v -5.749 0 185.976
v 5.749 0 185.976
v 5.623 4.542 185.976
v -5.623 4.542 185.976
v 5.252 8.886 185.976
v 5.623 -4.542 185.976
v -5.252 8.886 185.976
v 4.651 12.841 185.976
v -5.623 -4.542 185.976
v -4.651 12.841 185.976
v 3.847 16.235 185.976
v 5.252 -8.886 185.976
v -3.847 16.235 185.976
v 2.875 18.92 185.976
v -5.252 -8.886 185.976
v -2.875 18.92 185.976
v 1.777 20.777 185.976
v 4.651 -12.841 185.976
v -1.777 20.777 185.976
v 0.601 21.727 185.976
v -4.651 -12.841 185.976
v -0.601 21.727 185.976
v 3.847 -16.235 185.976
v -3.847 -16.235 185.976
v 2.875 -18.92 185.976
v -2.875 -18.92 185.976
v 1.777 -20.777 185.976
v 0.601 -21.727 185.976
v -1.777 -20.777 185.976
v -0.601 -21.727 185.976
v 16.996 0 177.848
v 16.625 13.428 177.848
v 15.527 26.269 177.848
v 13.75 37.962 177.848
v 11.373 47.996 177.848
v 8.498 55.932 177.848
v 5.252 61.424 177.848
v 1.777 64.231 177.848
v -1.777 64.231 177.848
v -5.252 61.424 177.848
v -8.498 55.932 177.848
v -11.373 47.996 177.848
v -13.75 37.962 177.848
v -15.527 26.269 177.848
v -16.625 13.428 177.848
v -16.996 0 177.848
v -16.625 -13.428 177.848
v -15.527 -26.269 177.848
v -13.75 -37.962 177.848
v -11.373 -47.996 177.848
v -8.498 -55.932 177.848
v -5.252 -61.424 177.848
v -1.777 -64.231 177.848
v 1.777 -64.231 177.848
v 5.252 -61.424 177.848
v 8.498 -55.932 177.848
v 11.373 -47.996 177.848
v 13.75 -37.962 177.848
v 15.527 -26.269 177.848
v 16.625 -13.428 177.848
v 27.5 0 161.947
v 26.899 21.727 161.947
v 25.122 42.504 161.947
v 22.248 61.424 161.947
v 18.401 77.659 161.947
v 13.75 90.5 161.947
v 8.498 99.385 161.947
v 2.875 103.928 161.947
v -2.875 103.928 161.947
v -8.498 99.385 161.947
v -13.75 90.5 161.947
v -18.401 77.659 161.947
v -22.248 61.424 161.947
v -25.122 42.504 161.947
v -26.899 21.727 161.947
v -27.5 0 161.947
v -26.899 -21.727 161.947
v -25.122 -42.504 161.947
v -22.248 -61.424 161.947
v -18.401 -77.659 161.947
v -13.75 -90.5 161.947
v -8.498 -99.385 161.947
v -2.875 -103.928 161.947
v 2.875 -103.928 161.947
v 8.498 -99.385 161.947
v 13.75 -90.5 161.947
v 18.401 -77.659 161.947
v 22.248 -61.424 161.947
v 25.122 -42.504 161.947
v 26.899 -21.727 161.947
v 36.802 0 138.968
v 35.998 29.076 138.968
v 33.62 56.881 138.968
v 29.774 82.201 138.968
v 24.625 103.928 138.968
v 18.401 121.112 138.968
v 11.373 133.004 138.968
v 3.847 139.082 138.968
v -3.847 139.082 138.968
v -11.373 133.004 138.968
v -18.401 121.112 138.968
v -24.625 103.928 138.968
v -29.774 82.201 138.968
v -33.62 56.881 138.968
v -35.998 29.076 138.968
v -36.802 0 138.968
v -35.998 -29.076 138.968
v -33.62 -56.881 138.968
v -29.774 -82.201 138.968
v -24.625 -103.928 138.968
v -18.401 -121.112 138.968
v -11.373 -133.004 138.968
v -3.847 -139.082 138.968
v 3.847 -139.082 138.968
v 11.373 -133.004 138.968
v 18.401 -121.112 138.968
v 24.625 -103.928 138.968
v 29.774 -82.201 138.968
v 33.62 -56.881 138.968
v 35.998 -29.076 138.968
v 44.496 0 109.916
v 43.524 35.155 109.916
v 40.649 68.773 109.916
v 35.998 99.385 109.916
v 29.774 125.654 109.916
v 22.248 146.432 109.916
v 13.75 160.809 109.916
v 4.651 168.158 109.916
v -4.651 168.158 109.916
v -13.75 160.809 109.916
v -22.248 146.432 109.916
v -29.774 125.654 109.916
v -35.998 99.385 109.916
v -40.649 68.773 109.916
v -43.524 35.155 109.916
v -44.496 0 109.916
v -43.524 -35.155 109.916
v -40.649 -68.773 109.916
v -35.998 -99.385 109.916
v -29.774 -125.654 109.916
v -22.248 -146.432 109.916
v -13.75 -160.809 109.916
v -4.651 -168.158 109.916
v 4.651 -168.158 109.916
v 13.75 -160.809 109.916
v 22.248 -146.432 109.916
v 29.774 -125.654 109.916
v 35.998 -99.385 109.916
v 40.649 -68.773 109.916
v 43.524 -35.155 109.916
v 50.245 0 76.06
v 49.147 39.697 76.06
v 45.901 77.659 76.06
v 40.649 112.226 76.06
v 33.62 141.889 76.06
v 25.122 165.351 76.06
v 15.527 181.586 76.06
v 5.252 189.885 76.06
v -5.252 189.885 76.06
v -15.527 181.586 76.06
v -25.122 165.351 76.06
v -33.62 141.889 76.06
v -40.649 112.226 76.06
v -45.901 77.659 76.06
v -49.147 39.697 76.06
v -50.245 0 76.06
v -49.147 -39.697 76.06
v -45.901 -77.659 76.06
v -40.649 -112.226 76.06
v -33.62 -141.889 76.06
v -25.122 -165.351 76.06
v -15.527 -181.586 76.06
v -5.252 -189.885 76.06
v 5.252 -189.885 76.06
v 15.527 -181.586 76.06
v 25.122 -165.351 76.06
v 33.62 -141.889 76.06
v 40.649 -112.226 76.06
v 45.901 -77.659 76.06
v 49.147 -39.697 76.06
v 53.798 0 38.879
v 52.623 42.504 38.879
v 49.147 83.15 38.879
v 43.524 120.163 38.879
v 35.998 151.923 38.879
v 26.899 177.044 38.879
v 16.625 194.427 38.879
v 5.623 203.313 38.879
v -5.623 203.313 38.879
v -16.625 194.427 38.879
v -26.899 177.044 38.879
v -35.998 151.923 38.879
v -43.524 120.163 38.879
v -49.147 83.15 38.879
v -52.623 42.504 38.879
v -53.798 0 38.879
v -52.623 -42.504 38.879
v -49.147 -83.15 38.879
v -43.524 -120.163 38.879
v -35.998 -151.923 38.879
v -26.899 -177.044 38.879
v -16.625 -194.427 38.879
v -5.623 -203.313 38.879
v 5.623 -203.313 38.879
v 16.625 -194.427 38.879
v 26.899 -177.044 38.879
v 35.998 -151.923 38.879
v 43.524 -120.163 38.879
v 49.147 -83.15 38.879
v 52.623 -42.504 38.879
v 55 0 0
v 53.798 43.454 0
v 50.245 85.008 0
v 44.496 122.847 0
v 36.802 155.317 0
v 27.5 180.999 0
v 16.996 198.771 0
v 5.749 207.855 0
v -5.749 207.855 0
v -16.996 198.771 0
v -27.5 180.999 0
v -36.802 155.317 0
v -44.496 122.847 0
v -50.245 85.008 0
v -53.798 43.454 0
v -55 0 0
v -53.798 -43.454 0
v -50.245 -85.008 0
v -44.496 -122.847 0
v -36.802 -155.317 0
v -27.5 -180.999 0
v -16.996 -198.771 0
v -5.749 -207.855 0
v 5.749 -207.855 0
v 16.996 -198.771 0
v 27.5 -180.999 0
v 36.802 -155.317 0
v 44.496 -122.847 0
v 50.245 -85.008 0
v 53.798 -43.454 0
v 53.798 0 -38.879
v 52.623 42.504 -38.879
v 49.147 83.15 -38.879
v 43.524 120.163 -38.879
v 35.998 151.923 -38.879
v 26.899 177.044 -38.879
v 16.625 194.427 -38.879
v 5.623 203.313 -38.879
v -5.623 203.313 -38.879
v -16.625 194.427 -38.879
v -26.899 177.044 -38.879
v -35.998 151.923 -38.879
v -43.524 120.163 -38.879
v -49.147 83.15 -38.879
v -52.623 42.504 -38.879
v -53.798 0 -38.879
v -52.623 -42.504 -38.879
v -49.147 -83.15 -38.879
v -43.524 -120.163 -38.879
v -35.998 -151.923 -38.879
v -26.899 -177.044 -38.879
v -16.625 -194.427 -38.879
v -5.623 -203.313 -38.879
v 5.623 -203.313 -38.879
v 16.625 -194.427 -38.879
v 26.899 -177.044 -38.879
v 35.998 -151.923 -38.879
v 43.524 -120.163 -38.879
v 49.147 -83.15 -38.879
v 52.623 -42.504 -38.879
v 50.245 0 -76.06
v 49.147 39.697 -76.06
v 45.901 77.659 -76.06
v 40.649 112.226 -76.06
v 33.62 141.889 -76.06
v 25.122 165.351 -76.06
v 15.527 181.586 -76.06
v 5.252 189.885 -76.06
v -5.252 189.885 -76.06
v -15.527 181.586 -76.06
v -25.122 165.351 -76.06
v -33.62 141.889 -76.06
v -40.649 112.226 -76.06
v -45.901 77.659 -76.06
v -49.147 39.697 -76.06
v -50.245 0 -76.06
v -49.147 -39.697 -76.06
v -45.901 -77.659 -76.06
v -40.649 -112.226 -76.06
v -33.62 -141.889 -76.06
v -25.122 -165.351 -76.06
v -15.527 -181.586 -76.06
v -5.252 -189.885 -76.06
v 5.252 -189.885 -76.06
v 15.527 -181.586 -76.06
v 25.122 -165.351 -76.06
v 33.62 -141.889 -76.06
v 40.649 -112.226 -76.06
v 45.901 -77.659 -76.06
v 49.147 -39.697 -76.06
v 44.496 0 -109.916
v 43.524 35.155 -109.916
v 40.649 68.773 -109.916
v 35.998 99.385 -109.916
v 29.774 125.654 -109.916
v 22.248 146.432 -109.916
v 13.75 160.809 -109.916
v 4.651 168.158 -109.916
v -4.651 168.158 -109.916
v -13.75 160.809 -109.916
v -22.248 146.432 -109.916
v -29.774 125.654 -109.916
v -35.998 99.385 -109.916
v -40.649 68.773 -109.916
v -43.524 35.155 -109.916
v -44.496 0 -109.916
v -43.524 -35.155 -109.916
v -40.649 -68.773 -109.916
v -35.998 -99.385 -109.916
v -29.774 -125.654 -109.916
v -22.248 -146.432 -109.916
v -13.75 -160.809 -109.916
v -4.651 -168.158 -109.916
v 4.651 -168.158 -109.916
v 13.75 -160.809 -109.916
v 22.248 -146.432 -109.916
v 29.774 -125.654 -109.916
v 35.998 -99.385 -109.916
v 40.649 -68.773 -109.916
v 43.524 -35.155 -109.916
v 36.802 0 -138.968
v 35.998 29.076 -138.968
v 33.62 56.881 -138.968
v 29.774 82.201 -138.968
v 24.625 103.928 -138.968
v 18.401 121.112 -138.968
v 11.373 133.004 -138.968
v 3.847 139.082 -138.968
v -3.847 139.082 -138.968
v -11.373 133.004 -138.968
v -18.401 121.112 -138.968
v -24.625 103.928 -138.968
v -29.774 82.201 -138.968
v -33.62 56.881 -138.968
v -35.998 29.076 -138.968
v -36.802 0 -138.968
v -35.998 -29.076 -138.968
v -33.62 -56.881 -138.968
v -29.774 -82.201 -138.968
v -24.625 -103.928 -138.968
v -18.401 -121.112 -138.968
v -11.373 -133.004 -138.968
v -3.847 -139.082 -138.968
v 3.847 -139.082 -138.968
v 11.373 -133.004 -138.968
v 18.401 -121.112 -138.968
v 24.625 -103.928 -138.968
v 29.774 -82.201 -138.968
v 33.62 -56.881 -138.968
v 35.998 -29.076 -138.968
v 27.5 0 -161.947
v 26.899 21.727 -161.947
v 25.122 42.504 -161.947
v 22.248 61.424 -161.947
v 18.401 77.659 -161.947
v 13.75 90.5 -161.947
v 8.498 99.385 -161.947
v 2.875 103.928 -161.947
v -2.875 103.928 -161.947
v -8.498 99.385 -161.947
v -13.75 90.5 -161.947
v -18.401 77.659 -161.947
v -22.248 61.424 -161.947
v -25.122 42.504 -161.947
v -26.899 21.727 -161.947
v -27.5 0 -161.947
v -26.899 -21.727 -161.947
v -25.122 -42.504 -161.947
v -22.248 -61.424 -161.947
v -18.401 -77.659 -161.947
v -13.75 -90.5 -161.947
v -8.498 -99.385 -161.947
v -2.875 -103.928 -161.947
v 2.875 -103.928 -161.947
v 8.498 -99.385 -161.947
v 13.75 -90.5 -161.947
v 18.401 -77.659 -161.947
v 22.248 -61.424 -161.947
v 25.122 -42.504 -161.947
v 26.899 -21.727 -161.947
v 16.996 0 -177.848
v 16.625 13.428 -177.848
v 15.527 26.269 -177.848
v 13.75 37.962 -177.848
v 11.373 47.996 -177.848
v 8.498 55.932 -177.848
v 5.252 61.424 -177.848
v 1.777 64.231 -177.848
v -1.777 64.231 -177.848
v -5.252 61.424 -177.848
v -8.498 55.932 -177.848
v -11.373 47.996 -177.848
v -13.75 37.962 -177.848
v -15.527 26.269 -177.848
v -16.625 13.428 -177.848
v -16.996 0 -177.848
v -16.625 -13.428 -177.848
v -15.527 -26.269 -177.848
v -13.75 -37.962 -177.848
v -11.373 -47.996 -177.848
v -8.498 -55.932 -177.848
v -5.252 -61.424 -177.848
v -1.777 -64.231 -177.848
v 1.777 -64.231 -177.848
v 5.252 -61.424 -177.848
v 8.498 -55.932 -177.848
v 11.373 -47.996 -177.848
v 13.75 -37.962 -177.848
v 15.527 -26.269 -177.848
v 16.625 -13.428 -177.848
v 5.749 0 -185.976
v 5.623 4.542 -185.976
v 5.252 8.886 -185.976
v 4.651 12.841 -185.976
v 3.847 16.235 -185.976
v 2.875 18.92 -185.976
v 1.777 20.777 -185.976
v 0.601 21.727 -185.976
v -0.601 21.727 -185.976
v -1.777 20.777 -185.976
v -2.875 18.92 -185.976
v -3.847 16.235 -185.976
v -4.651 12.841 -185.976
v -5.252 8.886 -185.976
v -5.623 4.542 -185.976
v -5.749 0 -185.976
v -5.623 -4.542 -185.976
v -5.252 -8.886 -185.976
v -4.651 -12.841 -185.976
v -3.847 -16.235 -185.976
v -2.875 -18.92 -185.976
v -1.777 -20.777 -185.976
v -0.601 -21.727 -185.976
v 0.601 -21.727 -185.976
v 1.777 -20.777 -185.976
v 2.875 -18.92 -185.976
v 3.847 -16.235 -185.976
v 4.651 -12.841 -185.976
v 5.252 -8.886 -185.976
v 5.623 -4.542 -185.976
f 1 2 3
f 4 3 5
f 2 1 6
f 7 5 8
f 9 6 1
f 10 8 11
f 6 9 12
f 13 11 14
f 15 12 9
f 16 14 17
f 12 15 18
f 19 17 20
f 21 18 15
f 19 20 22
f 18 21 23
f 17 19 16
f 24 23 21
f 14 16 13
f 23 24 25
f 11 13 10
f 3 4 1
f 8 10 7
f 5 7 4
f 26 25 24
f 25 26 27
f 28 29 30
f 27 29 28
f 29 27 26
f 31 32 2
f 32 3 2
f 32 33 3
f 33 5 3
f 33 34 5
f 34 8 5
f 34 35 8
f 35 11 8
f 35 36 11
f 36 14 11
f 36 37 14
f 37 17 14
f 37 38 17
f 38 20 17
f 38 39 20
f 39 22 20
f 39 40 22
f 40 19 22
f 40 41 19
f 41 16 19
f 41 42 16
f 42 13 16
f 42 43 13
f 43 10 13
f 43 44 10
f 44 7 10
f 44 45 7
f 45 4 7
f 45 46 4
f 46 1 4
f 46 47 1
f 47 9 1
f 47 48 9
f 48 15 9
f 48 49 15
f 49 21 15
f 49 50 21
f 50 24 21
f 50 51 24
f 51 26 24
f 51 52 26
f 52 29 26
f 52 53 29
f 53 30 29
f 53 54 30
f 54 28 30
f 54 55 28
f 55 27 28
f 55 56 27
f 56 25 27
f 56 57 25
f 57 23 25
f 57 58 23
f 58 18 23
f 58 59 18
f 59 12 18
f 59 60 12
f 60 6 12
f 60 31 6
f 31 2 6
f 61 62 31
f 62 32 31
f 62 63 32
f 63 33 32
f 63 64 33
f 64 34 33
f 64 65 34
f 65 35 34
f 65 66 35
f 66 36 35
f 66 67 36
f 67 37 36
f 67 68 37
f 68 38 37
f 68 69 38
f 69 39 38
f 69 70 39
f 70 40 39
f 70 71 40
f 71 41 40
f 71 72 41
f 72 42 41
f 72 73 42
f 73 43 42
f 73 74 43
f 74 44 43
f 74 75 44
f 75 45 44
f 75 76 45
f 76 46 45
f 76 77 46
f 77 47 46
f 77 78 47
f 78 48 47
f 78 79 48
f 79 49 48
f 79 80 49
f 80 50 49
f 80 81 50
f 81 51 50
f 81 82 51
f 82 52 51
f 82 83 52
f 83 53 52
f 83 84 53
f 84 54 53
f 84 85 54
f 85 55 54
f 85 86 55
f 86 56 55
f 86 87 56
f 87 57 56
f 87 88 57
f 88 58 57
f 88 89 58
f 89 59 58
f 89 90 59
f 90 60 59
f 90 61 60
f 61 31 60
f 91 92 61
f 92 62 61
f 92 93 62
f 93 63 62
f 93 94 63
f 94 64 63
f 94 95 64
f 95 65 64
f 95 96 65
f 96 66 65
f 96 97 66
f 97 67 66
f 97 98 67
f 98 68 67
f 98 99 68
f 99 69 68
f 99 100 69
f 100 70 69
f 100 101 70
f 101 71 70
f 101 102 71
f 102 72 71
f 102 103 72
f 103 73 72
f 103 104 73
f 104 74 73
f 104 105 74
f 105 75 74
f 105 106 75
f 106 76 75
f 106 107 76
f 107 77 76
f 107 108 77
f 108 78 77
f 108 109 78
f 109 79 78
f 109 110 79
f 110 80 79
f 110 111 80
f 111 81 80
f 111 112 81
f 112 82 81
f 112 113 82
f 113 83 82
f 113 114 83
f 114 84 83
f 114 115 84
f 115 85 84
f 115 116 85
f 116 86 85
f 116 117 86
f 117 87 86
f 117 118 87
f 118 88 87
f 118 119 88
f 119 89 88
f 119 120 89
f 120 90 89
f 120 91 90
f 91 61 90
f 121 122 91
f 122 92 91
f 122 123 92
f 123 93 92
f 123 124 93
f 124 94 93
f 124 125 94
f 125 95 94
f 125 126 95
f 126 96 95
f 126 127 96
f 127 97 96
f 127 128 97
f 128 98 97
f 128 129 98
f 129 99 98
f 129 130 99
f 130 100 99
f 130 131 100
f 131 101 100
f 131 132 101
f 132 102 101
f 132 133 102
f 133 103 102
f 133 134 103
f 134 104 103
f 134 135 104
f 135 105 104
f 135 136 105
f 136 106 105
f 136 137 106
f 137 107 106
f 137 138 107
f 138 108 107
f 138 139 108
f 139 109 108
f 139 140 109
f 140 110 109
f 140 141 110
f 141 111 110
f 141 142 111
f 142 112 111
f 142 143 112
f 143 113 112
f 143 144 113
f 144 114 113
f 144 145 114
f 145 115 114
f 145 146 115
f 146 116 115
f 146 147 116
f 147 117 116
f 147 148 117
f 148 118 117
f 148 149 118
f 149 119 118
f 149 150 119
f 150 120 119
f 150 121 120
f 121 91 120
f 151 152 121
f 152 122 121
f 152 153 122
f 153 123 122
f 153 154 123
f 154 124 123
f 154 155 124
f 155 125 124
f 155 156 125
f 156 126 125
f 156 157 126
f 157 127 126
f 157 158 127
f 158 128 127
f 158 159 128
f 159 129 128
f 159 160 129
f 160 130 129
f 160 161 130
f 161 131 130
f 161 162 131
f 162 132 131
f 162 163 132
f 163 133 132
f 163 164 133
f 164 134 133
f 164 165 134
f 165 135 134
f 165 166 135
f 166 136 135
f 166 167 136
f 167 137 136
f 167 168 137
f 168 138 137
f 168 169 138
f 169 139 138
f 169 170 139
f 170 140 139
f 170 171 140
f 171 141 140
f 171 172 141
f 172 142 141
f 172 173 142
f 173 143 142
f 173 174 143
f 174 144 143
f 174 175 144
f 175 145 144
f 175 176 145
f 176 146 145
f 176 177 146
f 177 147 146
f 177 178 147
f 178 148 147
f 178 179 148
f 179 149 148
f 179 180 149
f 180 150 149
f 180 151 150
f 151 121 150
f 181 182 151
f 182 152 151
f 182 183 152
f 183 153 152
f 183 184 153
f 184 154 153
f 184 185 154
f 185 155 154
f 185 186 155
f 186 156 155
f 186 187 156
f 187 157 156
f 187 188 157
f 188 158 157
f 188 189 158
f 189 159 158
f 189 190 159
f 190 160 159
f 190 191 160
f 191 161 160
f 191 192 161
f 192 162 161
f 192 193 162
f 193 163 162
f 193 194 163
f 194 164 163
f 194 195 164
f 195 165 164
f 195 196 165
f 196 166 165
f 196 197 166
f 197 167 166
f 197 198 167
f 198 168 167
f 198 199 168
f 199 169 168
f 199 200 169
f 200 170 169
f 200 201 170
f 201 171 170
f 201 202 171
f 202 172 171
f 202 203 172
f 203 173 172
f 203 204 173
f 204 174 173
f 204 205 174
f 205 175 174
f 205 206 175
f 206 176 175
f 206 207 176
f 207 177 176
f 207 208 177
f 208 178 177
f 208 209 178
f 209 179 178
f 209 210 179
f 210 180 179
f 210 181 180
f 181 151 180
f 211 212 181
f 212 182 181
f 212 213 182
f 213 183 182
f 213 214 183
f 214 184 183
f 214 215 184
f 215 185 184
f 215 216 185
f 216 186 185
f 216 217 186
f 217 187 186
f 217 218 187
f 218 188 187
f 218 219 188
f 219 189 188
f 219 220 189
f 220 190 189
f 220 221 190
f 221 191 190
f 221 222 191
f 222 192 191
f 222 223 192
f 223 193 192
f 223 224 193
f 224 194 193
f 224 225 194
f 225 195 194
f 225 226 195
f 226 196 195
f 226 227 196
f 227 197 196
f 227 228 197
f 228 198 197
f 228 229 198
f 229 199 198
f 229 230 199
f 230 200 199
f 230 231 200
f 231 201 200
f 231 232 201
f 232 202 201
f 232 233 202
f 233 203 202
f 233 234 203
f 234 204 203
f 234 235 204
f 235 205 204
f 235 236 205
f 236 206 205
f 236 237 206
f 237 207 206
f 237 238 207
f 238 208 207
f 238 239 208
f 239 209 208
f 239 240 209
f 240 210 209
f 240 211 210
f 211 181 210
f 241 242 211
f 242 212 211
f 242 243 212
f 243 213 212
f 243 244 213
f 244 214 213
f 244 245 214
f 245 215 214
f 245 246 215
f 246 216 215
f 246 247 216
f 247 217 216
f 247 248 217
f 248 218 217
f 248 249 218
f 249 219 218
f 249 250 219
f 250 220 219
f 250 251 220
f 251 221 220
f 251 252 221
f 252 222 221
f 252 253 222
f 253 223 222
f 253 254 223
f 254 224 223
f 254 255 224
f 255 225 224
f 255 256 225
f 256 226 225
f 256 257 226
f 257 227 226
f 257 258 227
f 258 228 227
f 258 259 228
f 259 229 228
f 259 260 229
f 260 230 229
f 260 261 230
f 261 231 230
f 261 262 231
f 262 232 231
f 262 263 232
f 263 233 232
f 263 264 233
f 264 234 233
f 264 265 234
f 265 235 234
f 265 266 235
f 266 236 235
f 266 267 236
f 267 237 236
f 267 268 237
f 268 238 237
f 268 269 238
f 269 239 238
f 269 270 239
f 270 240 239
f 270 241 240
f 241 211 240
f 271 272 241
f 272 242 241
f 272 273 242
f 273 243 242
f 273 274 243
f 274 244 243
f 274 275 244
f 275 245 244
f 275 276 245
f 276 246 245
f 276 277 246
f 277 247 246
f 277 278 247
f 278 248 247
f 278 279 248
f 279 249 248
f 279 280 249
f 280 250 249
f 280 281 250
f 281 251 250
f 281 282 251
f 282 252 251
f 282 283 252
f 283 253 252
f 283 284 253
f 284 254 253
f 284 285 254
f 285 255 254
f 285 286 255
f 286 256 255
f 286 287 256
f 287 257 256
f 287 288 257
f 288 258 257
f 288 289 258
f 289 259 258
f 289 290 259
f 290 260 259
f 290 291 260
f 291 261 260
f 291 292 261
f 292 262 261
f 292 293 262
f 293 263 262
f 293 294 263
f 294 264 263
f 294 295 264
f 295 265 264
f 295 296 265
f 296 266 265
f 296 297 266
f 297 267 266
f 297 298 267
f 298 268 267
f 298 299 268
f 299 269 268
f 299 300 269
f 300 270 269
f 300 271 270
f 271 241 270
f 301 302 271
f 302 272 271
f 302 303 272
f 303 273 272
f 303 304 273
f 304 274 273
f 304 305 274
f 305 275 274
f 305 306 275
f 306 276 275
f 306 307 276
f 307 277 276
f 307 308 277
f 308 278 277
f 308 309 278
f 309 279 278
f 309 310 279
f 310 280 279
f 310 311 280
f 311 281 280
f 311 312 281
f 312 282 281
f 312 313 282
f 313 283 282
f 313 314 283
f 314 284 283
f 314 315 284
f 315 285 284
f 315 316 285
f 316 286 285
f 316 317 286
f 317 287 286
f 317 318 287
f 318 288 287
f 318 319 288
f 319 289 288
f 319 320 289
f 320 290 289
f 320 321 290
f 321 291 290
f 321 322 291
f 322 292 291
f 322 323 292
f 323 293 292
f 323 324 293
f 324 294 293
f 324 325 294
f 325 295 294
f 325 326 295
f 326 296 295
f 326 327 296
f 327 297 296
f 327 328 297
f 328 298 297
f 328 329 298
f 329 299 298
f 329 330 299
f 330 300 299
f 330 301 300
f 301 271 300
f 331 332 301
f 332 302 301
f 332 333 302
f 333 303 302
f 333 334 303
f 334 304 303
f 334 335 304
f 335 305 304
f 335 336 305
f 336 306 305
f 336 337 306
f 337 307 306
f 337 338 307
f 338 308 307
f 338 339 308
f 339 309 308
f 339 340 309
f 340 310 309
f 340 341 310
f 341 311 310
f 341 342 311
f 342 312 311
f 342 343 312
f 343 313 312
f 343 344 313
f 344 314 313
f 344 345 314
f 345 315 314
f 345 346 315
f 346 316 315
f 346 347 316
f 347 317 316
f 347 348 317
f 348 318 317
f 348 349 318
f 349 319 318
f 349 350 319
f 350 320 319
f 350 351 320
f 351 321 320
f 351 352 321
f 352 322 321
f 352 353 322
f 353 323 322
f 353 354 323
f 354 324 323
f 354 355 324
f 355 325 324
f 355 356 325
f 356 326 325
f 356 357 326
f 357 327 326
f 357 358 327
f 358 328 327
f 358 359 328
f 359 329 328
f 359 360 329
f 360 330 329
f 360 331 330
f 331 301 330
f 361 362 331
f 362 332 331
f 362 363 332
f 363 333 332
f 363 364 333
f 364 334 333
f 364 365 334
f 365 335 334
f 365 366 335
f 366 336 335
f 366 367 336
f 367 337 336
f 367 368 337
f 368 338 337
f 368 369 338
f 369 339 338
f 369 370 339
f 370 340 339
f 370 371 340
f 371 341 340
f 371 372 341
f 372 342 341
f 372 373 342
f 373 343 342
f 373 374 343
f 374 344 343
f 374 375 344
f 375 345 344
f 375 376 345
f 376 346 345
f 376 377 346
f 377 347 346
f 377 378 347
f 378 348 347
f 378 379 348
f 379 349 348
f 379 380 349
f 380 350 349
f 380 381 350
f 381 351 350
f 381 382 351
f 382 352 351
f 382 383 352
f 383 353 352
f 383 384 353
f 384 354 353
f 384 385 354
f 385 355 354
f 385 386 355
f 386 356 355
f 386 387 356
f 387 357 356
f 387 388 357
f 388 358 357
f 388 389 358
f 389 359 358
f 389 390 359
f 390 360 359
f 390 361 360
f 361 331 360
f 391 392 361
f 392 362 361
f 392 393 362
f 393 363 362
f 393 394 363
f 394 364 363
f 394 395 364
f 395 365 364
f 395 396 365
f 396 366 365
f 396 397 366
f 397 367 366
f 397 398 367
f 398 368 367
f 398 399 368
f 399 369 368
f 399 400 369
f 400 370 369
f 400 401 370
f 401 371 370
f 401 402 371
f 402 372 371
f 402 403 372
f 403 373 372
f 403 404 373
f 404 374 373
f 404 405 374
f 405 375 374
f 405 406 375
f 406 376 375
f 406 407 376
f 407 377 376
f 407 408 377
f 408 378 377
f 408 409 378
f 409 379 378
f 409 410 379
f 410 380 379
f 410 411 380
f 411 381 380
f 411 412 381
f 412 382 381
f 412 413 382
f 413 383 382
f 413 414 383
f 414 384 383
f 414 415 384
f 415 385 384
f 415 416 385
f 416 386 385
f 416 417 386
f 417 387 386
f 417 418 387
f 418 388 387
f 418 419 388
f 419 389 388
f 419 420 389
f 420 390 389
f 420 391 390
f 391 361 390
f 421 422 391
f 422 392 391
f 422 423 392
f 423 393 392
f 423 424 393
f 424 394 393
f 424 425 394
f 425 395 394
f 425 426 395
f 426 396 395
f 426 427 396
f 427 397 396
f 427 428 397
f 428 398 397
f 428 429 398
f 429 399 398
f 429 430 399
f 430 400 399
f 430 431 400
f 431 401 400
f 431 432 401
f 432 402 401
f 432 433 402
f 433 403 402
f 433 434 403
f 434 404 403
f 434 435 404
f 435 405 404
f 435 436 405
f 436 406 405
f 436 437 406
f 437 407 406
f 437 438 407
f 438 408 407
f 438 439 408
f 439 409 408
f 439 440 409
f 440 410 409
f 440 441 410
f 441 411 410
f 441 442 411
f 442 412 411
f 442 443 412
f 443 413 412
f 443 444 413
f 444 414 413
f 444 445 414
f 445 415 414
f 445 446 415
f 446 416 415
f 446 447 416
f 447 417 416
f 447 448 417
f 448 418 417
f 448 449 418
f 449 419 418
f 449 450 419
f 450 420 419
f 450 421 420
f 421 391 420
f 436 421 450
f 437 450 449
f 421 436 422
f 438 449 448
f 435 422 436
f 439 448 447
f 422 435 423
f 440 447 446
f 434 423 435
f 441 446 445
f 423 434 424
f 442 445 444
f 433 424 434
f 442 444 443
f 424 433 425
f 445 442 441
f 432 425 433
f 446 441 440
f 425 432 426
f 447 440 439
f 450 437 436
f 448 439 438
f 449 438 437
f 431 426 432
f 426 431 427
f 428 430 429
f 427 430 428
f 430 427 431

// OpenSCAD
// Generated by SolidPython 1.0.1 on 2020-07-29 00:46:47


scale(v = [5, 19, 17]) {
	sphere(r = 11);
}
/***********************************************
*********      SolidPython code:      **********
************************************************
 
# import packages: SolidPython
from solid import *
from solid.utils import *
from itertools import chain, combinations, permutations


class Resize:

    def __init__(self, scad_file):
        self.scad_file = scad_file
        #self.scad_file = import_scad(scad_file)
        # cone/cylinder param:
        self.r1 = 0
        self.r2 = 0
        self.h = 0
        # rectangular prism param:
        self.w = 0
        self.l = 0
        # ellipse param:
        self.r = 0

    # import OpenScad code (file name corresponds to shape)


    # classify shape + parameters
    def assign(self, param1, param2, param3):
        if self.scad_file == 'cone.scad':
            self.r1 = param1
            self.r2 = param2
            self.h = param3
        elif self.scad_file == 'cylinder.scad':
            self.r1 = param1
            self.r2 = param2
            self.h = param3
        elif self.scad_file == 'rectangularPrism.scad':
            self.h = param1
            self.l = param2
            self.w = param3
        else:
            self.r = param1
            self.h = param2

    # resize parameters
    def iterate(self):
        x = range(3, 20, 2)
        i = 1
        if self.scad_file == 'cone.scad':
            tempList = list(permutations(x, 2))
            for temp in tempList:
                param1 = temp[0]
                param2 = temp[1]
                filepath = 'produced_scad_files/' + 'cone' + str(param1) + '_' + str(param2) + '_' + '.scad'
                scad_render_to_file(cylinder(h=param1, r1=param2, r2=0), filepath)

        elif self.scad_file == 'cylinder.scad':
            tempList = list(permutations(x, 3))
            for temp in tempList:
                param1 = temp[0]
                param2 = temp[1]
                filepath = 'produced_scad_files/' + 'cylinder' + str(param1) + '_' + str(param2) + '_' + '.scad'
                scad_render_to_file(cylinder(h=param1, r1=param2, r2=param2), filepath)

        elif self.scad_file == 'rectangularPrism.scad':
            tempList = list(permutations(x, 3))
            for temp in tempList:
                param1 = temp[0]
                param2 = temp[1]
                param3 = temp[2]
                filepath = 'produced_scad_files/' + 'rectangularPrism' + str(param1) + '_' + str(param2) + '_' + str(
                    param3) + '.scad'
                scad_render_to_file(cube(size=(param1, param2, param3)), filepath)

        elif self.scad_file == 'ellipse.scad':
            tempList = list(permutations(x, 4))
            for temp in tempList:
                param1 = temp[0]
                param2 = temp[1]
                param3 = temp[2]
                param4 = temp[3]
                filepath = 'produced_scad_files/' + 'ellipse' + str(param1) + '_' + str(param2) + '_' + str(param3) + '_' + str(param4) + '.scad'
                scad_render_to_file(scale([param1, param2, param3])(sphere(r=param4)), filepath)

    def render_to_scadfile(self):
        scad_render_to_file(scad, 'example.scad') 
 
************************************************/
